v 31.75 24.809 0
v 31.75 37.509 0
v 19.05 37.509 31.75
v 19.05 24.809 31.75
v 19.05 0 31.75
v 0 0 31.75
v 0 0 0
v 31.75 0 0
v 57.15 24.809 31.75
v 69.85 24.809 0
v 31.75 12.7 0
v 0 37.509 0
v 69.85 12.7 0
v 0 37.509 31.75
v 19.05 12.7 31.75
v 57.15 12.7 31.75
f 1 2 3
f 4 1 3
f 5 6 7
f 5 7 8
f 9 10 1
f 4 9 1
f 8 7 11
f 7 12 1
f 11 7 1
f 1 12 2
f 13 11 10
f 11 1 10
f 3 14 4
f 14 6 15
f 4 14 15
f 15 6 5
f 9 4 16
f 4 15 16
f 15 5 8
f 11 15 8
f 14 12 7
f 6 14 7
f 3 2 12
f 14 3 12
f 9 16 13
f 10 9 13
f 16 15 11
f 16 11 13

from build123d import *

# Parameters (mm, degrees)
F1_DEPTH = 31.75
F3_DEPTH = 25.4
F5_DEPTH = 12.7
F7_DEPTH = 12.7
F8_DEPTH = 25.4


with BuildPart() as f1:
    # F0 (on Top) → F1 (new body)
    with BuildSketch(Plane.XY):
        Polygon((0, 37.5093027622), (0, 0), (31.75, 0), (31.75, 12.7), (69.85, 12.7), (69.85, 24.8093027622), (31.75, 24.8093027622), (31.75, 37.5093027622), align=None)
    extrude(amount=F1_DEPTH)

    # F2 (on face) → F3 (cut)
    with BuildSketch(Plane.XZ.offset(-12.7)):
        Polygon((57.15, 31.75), (69.85, 0), (69.85, 31.75), align=None)
    extrude(amount=-F3_DEPTH, mode=Mode.SUBTRACT)

    # F4 (on face) → F5 (cut)
    with BuildSketch(Plane.XZ):
        Polygon((19.05, 31.75), (31.75, 0), (31.75, 31.75), align=None)
    extrude(amount=-F5_DEPTH, mode=Mode.SUBTRACT)

    # F6 (on face) → F7 (join)
    with BuildSketch(Plane(origin=(0, 37.5093027622, 0), x_dir=(-1, 0, 0), z_dir=(0, 1, 0))):
        Polygon((-31.75, 31.75), (-31.75, 0), (-19.05, 31.75), align=None)
    extrude(amount=F7_DEPTH)

    # F8 (cut): a face of the model
    f8_faces = [f1.faces().sort_by_distance(p)[0] for p in [
        (27.5166666667, 50.2093027622, 21.1666666667),
    ]]
    extrude(f8_faces, amount=-F8_DEPTH, mode=Mode.SUBTRACT)


solid = f1.part
